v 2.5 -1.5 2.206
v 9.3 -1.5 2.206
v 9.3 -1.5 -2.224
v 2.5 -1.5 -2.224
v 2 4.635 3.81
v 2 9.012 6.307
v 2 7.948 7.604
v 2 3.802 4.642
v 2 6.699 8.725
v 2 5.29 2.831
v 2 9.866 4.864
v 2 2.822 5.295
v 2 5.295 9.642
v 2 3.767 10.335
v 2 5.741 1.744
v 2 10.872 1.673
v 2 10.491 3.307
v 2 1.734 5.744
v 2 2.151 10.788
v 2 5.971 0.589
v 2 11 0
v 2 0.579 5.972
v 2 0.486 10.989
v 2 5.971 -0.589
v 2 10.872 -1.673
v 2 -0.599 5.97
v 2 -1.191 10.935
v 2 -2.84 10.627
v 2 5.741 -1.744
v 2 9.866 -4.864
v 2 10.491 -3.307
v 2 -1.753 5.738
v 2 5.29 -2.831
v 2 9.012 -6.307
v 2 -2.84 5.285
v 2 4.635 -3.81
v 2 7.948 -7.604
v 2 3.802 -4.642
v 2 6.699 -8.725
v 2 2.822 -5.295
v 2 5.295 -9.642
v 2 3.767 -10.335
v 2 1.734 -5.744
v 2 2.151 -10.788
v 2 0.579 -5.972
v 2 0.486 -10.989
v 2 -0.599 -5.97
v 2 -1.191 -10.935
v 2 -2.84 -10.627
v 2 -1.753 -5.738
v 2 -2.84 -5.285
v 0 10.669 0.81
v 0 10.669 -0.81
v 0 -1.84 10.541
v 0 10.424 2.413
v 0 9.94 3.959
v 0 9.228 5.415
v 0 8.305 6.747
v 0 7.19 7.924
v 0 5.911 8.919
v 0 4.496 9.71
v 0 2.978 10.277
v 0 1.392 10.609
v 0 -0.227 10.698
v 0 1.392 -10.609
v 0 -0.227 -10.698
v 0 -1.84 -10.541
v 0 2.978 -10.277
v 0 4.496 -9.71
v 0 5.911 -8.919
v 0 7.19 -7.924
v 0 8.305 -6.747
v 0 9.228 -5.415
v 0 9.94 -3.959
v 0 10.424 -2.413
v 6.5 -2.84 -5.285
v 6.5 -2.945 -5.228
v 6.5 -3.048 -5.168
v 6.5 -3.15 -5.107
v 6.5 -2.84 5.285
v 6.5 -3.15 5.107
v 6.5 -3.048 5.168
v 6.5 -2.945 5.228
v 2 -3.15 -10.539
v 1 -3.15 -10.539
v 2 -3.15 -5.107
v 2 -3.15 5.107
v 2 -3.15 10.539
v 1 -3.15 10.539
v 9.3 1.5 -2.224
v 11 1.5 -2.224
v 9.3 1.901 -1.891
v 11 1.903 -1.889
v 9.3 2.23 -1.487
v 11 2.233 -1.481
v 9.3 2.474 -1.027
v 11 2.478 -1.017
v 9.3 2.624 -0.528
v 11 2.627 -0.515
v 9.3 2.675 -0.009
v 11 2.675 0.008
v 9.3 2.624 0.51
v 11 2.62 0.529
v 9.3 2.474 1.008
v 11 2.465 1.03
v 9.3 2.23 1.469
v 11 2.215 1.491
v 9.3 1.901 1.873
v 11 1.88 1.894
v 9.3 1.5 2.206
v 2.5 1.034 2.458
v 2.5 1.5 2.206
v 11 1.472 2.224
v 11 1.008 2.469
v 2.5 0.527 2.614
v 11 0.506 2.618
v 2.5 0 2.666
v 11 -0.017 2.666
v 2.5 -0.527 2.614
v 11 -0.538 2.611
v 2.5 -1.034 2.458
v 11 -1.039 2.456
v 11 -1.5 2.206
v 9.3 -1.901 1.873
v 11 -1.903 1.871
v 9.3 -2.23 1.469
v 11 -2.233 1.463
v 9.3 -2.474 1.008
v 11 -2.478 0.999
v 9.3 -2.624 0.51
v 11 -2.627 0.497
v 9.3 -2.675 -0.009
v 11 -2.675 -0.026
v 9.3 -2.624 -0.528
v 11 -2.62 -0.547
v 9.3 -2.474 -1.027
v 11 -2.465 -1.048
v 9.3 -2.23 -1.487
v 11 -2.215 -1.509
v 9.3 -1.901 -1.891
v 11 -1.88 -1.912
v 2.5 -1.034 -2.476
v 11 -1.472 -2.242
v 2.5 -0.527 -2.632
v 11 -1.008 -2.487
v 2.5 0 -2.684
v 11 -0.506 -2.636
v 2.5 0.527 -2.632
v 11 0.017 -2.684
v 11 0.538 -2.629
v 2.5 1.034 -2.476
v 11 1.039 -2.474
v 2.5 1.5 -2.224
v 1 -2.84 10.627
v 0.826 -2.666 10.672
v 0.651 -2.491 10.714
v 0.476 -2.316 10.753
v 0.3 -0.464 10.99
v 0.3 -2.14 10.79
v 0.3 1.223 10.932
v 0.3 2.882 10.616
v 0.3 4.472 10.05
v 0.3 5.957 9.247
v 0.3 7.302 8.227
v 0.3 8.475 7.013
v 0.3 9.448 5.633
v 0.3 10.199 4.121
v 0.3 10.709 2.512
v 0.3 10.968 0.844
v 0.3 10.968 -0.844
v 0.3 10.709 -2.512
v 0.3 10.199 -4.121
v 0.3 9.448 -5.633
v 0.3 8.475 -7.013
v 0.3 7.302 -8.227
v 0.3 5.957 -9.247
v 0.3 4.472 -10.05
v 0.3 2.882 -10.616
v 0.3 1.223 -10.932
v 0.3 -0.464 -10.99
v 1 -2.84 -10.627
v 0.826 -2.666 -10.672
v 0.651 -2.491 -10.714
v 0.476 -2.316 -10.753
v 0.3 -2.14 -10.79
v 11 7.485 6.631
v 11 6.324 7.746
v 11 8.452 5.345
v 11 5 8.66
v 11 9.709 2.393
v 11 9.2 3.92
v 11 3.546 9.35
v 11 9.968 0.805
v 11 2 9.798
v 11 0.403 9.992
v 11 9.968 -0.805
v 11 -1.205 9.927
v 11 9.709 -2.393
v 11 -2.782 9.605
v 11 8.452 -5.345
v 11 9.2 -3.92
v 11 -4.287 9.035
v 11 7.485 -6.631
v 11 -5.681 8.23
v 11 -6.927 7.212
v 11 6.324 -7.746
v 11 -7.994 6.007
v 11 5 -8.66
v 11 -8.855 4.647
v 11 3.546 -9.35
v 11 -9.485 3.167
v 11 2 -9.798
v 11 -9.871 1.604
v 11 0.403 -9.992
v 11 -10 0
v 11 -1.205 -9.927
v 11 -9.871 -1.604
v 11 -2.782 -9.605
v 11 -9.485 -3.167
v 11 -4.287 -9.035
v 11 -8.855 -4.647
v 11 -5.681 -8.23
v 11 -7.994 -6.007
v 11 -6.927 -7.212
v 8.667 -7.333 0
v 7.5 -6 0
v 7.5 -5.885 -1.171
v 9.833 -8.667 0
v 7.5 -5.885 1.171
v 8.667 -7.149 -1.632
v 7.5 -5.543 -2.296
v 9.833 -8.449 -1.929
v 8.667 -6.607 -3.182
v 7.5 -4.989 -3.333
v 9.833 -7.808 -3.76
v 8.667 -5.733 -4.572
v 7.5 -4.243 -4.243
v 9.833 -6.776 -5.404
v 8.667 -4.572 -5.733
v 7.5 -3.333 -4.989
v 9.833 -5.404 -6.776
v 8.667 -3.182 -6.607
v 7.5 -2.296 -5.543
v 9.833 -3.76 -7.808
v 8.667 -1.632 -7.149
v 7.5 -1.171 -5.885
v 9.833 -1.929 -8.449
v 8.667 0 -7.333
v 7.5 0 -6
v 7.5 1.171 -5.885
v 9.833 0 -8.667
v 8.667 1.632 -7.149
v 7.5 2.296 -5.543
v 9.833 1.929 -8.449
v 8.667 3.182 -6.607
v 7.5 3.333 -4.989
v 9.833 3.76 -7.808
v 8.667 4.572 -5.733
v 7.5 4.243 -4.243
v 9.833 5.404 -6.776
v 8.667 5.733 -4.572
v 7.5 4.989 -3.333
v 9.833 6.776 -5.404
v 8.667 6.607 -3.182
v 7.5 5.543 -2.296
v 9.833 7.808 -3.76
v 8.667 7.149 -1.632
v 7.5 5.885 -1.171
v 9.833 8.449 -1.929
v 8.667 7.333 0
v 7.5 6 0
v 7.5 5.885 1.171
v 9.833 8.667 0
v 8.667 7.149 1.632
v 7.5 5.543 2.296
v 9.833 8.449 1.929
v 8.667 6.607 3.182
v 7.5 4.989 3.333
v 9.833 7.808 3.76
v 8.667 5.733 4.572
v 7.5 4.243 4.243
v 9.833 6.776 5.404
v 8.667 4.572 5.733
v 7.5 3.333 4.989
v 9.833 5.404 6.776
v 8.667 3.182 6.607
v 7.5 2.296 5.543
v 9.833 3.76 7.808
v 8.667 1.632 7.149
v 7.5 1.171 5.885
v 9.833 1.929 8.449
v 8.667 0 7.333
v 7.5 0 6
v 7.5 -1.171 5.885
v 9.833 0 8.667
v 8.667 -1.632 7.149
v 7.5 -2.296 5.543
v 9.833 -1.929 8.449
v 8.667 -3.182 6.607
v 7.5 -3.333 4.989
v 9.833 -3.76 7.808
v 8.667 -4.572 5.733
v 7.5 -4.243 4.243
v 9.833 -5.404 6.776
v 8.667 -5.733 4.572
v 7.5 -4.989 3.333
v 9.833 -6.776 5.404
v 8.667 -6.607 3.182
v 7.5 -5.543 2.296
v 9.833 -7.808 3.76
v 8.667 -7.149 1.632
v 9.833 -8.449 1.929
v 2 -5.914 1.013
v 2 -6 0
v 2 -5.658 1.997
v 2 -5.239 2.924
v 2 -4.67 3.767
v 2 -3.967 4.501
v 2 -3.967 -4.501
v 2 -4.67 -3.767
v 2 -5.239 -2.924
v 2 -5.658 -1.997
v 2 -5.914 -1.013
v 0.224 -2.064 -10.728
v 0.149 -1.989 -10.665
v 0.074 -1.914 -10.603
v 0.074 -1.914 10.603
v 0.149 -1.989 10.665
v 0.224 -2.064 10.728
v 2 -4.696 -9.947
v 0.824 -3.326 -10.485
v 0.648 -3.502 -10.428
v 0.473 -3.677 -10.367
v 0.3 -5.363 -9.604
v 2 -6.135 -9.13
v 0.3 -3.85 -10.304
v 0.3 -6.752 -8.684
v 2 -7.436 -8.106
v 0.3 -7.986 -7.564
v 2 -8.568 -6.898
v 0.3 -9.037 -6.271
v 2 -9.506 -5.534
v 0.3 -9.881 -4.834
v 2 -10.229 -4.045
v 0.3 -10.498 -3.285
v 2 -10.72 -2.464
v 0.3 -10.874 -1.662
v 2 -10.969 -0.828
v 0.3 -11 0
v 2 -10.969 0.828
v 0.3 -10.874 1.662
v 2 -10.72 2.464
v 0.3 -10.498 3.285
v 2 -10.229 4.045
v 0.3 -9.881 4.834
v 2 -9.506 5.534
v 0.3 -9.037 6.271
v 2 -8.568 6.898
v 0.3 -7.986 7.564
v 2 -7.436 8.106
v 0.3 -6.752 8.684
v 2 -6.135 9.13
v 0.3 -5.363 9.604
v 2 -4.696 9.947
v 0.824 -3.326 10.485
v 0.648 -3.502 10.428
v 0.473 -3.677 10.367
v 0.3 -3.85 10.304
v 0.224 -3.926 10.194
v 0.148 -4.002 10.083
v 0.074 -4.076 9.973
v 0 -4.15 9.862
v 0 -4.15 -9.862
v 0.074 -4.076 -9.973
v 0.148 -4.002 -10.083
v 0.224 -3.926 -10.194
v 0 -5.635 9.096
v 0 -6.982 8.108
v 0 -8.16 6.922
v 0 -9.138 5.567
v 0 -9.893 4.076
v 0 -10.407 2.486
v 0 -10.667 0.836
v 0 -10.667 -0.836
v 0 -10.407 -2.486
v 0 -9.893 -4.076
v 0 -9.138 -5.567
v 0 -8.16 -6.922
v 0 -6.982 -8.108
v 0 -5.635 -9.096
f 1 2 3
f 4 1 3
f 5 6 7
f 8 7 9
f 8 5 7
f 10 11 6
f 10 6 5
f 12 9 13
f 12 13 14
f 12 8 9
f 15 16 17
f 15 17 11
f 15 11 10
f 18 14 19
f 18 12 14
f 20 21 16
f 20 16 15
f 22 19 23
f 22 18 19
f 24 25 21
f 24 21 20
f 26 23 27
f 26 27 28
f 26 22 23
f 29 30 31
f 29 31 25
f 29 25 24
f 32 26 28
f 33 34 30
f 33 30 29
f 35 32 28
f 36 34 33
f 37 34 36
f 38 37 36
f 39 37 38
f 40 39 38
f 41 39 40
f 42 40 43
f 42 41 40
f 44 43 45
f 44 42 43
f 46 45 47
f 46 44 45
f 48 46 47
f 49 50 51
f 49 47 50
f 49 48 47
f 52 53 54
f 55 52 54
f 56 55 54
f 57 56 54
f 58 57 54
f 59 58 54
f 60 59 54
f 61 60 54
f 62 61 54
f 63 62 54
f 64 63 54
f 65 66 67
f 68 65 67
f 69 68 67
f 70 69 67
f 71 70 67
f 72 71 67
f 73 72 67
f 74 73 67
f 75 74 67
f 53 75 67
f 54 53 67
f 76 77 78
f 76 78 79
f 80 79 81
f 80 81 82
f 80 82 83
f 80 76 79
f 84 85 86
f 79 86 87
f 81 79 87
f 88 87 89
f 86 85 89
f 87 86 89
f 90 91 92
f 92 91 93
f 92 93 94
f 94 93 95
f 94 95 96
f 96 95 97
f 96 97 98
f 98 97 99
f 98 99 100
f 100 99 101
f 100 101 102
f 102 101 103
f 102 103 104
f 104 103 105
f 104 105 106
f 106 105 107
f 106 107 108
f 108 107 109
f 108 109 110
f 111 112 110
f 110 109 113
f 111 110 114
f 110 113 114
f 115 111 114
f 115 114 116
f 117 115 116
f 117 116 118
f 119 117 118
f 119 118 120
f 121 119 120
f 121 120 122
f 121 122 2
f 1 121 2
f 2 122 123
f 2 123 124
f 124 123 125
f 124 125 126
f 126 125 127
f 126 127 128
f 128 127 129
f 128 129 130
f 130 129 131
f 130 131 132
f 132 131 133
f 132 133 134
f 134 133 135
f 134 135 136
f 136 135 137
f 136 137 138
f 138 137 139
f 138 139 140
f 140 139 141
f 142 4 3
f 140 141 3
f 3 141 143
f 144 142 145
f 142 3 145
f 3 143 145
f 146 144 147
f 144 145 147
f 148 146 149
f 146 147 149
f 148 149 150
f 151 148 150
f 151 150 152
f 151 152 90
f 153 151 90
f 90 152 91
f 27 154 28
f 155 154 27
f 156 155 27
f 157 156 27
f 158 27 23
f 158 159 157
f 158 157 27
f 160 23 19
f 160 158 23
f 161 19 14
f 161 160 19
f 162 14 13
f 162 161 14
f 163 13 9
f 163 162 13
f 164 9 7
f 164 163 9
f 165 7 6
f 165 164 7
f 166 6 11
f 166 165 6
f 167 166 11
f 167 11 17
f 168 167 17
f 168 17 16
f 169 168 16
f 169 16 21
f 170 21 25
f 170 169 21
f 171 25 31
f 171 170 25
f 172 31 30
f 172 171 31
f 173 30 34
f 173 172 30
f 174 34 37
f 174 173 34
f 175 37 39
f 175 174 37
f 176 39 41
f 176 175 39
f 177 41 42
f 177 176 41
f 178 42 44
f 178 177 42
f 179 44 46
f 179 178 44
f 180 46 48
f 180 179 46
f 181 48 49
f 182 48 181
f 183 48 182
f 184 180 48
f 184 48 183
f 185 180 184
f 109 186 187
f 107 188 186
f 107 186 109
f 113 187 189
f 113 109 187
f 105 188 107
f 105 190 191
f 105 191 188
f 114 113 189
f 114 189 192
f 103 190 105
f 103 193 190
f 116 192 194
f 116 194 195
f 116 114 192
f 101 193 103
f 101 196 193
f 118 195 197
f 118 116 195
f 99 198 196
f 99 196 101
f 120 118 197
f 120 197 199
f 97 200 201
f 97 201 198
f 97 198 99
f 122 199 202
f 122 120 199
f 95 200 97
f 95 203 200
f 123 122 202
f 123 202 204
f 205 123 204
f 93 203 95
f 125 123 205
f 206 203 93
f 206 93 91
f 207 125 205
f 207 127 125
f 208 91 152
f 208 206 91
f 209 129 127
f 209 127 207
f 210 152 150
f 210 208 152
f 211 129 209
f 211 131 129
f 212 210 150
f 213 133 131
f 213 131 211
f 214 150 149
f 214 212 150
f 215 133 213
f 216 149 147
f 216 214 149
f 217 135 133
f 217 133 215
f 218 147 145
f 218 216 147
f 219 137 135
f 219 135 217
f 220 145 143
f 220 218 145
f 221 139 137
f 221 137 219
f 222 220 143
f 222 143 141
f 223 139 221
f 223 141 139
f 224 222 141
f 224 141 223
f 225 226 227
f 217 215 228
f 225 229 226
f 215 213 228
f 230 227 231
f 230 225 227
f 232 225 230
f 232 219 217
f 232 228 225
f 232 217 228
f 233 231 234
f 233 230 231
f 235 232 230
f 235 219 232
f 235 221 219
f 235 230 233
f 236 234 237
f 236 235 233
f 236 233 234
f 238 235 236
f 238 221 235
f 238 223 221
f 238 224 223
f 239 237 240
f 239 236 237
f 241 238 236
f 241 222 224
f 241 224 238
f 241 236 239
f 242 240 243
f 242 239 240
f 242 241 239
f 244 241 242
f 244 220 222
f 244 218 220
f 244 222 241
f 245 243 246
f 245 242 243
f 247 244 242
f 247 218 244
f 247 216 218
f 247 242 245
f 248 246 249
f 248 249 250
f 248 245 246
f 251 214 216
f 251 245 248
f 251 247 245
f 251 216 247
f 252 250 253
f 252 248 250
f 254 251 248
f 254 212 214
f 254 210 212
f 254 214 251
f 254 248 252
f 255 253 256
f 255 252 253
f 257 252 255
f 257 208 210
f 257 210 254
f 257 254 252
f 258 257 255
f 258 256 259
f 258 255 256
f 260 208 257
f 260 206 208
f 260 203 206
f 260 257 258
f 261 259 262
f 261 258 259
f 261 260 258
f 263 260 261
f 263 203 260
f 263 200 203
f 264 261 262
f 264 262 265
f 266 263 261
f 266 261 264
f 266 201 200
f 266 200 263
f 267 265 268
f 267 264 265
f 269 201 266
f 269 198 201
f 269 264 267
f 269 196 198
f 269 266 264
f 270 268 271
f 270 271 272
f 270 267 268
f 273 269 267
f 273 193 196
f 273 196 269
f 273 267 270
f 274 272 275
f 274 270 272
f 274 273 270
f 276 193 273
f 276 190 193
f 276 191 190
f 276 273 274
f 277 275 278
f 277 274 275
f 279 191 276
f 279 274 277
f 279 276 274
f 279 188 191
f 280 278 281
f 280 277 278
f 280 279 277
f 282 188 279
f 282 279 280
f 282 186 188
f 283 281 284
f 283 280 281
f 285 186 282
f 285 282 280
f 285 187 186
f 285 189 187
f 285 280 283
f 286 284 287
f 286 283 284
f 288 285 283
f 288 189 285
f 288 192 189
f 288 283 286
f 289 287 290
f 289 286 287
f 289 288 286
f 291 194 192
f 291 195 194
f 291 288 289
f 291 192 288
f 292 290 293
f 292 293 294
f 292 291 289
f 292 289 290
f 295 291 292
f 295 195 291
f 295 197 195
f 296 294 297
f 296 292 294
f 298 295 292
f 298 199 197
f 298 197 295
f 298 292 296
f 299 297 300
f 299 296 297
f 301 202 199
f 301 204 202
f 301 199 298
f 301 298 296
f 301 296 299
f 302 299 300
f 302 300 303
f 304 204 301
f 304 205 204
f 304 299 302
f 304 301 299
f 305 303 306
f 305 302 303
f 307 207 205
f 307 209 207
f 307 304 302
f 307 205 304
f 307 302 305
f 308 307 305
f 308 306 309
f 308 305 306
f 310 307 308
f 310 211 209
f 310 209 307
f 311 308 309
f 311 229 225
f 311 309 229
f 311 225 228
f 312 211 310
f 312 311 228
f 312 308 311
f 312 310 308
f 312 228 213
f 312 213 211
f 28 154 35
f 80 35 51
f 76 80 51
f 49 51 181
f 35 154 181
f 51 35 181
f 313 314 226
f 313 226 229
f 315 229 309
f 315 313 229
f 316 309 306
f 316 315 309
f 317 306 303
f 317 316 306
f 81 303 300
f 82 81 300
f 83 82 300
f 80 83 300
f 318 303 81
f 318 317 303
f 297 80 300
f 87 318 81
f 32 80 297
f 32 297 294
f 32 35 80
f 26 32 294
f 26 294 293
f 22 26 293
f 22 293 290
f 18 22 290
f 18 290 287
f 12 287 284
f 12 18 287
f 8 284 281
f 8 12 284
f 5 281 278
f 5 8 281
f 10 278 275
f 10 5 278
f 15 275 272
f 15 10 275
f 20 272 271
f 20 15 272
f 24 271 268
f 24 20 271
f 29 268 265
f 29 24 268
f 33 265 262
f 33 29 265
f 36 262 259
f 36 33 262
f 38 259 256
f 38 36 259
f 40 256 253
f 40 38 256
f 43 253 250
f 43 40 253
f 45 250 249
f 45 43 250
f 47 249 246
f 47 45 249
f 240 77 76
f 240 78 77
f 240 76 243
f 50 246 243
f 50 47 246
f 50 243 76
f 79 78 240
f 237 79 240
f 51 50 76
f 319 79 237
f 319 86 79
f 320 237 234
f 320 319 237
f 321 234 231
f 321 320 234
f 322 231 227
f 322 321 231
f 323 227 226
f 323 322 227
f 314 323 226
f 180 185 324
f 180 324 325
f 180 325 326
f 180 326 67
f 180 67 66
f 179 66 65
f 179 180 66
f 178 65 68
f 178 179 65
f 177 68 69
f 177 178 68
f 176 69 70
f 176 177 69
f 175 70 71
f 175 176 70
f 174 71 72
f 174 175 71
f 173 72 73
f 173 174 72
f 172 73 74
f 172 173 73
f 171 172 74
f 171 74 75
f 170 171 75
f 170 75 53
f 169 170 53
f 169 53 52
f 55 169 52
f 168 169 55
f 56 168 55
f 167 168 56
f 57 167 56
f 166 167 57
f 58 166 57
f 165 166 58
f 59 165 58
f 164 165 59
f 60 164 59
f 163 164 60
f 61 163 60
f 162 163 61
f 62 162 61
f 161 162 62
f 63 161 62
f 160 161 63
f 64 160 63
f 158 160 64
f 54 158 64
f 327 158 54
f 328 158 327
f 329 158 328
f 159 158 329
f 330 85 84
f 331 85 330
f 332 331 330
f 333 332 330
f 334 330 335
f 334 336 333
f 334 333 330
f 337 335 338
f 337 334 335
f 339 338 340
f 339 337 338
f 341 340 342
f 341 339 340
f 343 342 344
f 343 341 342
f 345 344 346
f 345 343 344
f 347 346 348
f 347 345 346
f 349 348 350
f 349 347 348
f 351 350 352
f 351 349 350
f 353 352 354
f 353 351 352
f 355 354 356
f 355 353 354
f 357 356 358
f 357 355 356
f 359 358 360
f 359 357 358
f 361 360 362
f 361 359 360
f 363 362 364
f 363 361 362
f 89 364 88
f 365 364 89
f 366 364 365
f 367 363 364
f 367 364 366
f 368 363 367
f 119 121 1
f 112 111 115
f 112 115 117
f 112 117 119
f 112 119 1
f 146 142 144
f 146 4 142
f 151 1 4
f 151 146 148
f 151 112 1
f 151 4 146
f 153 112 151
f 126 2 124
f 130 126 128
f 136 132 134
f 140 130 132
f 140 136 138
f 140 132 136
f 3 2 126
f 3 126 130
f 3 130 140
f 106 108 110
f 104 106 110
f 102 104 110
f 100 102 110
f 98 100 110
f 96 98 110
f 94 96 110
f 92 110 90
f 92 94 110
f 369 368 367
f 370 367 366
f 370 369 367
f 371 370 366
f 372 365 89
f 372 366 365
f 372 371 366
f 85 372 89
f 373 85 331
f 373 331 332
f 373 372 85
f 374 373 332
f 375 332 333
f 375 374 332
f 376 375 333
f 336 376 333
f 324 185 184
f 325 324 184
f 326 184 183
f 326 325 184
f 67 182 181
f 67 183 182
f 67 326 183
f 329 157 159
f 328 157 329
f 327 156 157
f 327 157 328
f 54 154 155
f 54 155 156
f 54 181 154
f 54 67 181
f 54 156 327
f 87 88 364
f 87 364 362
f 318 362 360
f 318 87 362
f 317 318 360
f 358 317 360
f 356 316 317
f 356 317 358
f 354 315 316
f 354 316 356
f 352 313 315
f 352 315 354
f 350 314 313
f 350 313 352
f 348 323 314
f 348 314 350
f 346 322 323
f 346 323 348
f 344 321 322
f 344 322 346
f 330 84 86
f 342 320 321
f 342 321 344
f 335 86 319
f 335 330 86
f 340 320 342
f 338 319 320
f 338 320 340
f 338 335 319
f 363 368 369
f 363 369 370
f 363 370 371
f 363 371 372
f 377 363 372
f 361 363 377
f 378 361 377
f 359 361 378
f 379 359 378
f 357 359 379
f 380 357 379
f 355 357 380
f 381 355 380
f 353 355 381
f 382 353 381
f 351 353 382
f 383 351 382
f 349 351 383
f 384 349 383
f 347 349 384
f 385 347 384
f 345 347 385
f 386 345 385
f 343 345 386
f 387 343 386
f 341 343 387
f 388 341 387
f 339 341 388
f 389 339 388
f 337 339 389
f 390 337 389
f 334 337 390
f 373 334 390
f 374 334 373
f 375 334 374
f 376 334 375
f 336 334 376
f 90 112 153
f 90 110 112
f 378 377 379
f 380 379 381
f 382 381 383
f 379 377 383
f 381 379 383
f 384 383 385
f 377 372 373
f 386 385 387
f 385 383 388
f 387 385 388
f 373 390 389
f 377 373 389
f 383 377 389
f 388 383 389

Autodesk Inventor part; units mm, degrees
ref_plane "YZ Plane" through (0, 0, 0) normal (1, 0, 0) x (0, 1, 0)
ref_plane "XZ Plane" through (0, 0, 0) normal (0, 1, 0) x (-1, 0, 0)
ref_plane "XY Plane" through (0, 0, 0) normal (0, 0, 1) x (1, 0, 0)
sketch "Skizze1" plane through (0, 0, 0) normal (0, 0, 1) x (1, 0, 0)
  line L0 (0, 0) -> (11, 0)
  line L1 (11, 0) -> (11, -6)
  line L2 (11, -6) -> (0, -6)
  line L3 (0, -6) -> (0, 0)
  line L4 (0, -6) -> (2, -6)
  line L5 (2, -6) -> (2, -11)
  line L6 (2, -11) -> (0, -11)
  line L7 (0, -11) -> (0, -6)
  line L8 (11, -6) -> (8.5, -6)
  line L9 (7.5, -6) -> (11, -10)
  line L10 (11, -10) -> (11, -6)
  dimension "d0" = 11
  dimension "d1" = 6
  dimension "d2" = 2
  dimension "d3" = 5
  dimension "d5" = 5.5
  dimension "d6" = 4
revolve "Umdrehung1" add sketch "Skizze1" angle 360 about axis through (0, 0, 0) along (1, 0, 0)
sketch "Skizze3" plane through (11, 0, 0) normal (1, 0, 0) x (0, 0, -1)
  circle A0 centre (0, 0) radius 10 projected
  circle A1 centre (0, 0) radius 11 projected
  circle A2 centre (0.009, 0) radius 2.675
  line L0 (-2.2058, 1.5) -> (2.2239, 1.5)
  line L1 (-2.2058, -1.5) -> (2.2239, -1.5)
  point P0 (17.2536, -1.634)
  dimension "d8" = 5.35
  dimension "d9" = 1.5
  dimension "d10" = 1.5
extrude "Extrusion1" cut sketch "Skizze3" against normal blind 8.5 contours A2 L1 L0
extrude "Extrusion2" cut sketch "Skizze3" against normal blind 1.7 contours L0 A2 | A2 L1
sketch "Skizze4" plane through (0, 0, 0) normal (-1, 0, 0) x (0, 0, 1)
  circle A0 centre (0, 0) radius 11 projected
  circle A1 centre (0, 0) radius 6 projected
  arc A2 (2.2058, -1.5) -> (2.2058, 1.5) centre (-0.009, 0) ccw projected
  arc A3 (-2.2239, -1.5) -> (2.2058, -1.5) centre (-0.009, 0) ccw projected
  arc A4 (-2.2239, 1.5) -> (-2.2239, -1.5) centre (-0.009, 0) ccw projected
  line L0 (2.2058, 1.5) -> (-2.2239, 1.5) projected
  line L1 (-2.2239, -1.5) -> (2.2058, -1.5) projected
  arc A5 (2.2058, 1.5) -> (-2.2239, 1.5) centre (-0.009, 0) ccw projected
  line L2 (-10.6271, -3.15) -> (10.6271, -3.15)
  line L3 (10.6271, -3.15) -> (10.6271, -2.84)
  line L4 (10.6271, -2.84) -> (-10.6271, -2.84)
  line L5 (-10.6271, -2.84) -> (-10.6271, -3.15)
  circle A6 centre (0, 0) radius 11 projected
  dimension "d15" = 0.31
  dimension "d16" = 2.84
extrude "Extrusion3" cut sketch "Skizze4" against normal blind 6.5 contours L4 A1 L2 A0 | A0 L2 L5 | L3 L2 A0 | A0 L2 A1 L4 | L4 A1 L2
chamfer "Fase1" distance 1 angle 45 2 edges at (0, -2.84, 0) (0, -3.15, 0)
chamfer "Fase2" distance 0.3 angle 45 2 edges at (0, -11, 0) (0, 11, 0)
sketch "Skizze5" plane through (0, 0, 0) normal (0, 1, 0) x (-1, 0, 0)
  circle A0 centre (-4.5, 0) radius 1.8
  line L0 (0, 10.7) -> (0, -10.7) projected
  point P0 (0, 0)
  point P1 (0, -10.5406)
  point P2 (0, 10.5406)
  dimension "d25" = 3.6
  dimension "d26" = 4.5
extrude "Extrusion4" [suppressed]
properties part number "PullingWheel"
